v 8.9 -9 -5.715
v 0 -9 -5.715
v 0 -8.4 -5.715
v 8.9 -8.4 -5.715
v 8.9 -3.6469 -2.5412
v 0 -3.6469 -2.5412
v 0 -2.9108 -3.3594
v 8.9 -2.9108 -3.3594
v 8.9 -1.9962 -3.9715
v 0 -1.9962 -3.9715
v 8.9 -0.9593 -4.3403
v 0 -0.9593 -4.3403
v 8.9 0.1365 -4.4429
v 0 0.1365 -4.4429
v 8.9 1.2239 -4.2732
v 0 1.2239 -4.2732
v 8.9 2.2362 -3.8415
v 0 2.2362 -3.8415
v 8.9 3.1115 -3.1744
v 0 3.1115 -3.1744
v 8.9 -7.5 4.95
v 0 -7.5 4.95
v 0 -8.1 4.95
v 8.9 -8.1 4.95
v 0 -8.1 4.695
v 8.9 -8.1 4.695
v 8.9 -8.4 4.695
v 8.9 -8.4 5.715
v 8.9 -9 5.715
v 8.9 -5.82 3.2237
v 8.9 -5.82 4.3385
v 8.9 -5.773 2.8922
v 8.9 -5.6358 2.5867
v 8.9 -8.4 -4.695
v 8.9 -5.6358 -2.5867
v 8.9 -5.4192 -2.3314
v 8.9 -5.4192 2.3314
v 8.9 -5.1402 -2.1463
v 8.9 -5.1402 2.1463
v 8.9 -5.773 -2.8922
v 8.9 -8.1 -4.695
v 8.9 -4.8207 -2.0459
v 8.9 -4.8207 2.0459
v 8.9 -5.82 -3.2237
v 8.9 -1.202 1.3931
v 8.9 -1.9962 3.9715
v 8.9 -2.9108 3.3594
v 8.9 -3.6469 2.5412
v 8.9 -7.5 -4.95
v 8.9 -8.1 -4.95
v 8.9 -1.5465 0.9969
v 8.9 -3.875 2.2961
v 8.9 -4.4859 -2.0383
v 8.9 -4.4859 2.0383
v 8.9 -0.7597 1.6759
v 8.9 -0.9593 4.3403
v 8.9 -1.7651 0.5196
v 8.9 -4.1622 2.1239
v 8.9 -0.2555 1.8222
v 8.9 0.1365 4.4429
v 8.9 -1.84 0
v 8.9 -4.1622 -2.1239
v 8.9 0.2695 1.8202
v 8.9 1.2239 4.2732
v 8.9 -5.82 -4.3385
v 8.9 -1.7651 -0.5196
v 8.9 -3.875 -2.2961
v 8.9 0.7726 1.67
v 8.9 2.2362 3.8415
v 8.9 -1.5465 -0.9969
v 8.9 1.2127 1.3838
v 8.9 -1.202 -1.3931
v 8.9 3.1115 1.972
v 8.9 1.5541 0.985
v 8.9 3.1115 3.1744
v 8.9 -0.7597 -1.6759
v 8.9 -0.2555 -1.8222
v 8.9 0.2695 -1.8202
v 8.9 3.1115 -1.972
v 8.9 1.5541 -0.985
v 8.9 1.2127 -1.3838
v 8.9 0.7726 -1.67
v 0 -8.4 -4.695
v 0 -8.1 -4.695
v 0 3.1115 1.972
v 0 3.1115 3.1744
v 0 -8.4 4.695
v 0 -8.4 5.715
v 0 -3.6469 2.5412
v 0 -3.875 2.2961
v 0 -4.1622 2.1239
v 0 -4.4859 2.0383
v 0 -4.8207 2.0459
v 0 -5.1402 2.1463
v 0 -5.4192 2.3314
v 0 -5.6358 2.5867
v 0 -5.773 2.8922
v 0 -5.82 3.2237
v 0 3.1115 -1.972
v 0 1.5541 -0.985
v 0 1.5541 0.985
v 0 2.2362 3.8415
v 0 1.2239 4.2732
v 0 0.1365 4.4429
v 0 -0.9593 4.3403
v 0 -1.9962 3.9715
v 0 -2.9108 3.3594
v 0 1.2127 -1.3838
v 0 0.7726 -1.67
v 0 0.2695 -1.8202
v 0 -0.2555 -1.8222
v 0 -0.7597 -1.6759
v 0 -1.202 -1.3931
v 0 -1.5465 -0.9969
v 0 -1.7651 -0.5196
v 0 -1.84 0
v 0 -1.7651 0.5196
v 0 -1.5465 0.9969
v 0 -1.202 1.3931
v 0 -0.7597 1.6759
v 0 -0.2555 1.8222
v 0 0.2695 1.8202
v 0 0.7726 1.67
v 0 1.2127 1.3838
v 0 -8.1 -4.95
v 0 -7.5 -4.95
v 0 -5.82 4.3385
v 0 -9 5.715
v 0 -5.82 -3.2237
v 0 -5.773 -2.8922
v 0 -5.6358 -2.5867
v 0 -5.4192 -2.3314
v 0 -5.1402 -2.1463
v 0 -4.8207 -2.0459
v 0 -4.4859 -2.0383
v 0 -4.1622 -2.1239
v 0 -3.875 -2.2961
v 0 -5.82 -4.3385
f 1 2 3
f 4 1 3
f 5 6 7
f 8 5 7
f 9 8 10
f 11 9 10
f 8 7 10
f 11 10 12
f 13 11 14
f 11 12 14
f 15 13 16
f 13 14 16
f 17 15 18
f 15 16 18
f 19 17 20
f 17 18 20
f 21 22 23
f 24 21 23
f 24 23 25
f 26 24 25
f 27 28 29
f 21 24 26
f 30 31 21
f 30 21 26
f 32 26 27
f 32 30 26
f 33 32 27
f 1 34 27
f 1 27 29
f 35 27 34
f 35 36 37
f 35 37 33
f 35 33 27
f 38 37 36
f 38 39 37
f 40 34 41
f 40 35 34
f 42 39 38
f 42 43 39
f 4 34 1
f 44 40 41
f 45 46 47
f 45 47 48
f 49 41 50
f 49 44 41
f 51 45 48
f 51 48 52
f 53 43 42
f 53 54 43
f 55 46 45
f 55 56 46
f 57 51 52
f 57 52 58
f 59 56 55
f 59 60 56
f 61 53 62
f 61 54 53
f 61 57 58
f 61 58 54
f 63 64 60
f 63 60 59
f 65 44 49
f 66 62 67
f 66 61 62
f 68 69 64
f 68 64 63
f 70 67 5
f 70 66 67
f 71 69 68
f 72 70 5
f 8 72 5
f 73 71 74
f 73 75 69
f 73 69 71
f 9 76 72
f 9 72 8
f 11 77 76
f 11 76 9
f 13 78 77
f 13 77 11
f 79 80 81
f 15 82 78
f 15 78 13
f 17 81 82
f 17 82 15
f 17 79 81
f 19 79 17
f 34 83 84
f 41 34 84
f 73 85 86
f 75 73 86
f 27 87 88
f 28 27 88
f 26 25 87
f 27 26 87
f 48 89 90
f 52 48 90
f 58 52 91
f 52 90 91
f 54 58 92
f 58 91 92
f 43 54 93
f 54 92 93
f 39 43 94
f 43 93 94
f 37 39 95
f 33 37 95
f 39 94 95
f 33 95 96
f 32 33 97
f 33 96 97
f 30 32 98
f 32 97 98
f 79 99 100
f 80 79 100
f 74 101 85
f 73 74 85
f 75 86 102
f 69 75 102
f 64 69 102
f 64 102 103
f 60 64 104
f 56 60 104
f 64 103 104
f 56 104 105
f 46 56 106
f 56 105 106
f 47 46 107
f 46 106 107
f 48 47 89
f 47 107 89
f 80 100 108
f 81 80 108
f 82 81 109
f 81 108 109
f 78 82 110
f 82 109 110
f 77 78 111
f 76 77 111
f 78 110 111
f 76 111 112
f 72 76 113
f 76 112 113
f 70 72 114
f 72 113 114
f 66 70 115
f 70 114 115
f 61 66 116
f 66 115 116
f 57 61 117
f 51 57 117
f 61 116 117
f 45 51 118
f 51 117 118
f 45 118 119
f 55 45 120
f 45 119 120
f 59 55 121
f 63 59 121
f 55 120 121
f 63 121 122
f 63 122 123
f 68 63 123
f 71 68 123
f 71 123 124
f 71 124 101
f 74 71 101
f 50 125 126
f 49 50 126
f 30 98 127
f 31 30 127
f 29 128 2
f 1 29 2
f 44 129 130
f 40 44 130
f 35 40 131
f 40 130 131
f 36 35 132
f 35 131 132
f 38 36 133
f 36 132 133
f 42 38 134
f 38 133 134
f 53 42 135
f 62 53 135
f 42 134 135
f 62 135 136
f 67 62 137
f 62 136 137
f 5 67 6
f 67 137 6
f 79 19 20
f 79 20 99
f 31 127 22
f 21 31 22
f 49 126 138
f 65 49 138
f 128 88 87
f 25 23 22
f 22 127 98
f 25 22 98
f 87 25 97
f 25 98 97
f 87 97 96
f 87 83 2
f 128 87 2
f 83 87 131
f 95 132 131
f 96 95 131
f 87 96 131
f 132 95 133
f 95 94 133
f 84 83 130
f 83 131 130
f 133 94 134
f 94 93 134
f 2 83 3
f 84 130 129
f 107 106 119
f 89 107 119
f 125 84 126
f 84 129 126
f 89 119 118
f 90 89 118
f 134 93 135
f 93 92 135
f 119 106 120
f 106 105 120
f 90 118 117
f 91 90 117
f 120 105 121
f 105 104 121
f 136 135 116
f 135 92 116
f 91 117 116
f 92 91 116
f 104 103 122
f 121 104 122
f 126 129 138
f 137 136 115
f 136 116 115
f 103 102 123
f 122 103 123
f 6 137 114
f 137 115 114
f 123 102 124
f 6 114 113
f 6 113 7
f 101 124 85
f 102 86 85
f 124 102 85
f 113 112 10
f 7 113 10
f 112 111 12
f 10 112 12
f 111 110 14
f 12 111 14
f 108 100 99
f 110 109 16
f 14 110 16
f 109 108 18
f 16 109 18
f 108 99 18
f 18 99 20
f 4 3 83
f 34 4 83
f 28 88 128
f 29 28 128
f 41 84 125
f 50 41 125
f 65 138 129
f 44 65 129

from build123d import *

# Parameters (mm, degrees)
BODY_DEPTH   = 8.9
TOPCUTSKE_W  = 8.89
TOPCUTSKE_H  = 8.89
TOPCUT_DEPTH = 8.9


with BuildPart() as part:
    # BodySke → Body (new body)
    with BuildSketch(Plane(origin=(0, 0, 0), x_dir=(0, 0, -1), z_dir=(1, 0, 0))):
        with BuildLine():
            Line((-5.715, -9), (5.715, -9))
            Line((5.715, -9), (5.715, -8.4))
            Line((5.715, -8.4), (4.695, -8.4))
            Line((4.695, -8.4), (4.695, -8.1))
            Line((4.695, -8.1), (4.95, -8.1))
            Line((4.95, -8.1), (4.95, -7.5))
            Line((4.95, -7.5), (4.338530006, -5.82))
            Line((4.338530006, -5.82), (3.223696854, -5.82))
            ThreePointArc((3.223696854, -5.82), (2.08483996, -4.983958225), (2.54124896, -3.646927299))
            ThreePointArc((2.54124896, -3.646927299), (4.44393925, 0.097102731), (2.379524457, 3.754449142))
            Line((2.379524457, 3.754449142), (0.985, 1.554147676))
            ThreePointArc((0.985, 1.554147676), (0, -1.84), (-0.985, 1.554147676))
            Line((-0.985, 1.554147676), (-2.379524457, 3.754449142))
            ThreePointArc((-2.379524457, 3.754449142), (-4.44393925, 0.097102731), (-2.54124896, -3.646927299))
            ThreePointArc((-2.54124896, -3.646927299), (-2.08483996, -4.983958225), (-3.223696854, -5.82))
            Line((-3.223696854, -5.82), (-4.338530006, -5.82))
            Line((-4.338530006, -5.82), (-4.95, -7.5))
            Line((-4.95, -7.5), (-4.95, -8.1))
            Line((-4.95, -8.1), (-4.695, -8.1))
            Line((-4.695, -8.1), (-4.695, -8.4))
            Line((-4.695, -8.4), (-5.715, -8.4))
            Line((-5.715, -8.4), (-5.715, -9))
        make_face()
    extrude(amount=BODY_DEPTH)

    # TopCutSke → TopCut (cut)
    with BuildSketch(Plane.ZY):
        with Locations((0, 7.5565)):
            Rectangle(TOPCUTSKE_W, TOPCUTSKE_H)
    extrude(amount=-TOPCUT_DEPTH, mode=Mode.SUBTRACT)


solid = part.part
